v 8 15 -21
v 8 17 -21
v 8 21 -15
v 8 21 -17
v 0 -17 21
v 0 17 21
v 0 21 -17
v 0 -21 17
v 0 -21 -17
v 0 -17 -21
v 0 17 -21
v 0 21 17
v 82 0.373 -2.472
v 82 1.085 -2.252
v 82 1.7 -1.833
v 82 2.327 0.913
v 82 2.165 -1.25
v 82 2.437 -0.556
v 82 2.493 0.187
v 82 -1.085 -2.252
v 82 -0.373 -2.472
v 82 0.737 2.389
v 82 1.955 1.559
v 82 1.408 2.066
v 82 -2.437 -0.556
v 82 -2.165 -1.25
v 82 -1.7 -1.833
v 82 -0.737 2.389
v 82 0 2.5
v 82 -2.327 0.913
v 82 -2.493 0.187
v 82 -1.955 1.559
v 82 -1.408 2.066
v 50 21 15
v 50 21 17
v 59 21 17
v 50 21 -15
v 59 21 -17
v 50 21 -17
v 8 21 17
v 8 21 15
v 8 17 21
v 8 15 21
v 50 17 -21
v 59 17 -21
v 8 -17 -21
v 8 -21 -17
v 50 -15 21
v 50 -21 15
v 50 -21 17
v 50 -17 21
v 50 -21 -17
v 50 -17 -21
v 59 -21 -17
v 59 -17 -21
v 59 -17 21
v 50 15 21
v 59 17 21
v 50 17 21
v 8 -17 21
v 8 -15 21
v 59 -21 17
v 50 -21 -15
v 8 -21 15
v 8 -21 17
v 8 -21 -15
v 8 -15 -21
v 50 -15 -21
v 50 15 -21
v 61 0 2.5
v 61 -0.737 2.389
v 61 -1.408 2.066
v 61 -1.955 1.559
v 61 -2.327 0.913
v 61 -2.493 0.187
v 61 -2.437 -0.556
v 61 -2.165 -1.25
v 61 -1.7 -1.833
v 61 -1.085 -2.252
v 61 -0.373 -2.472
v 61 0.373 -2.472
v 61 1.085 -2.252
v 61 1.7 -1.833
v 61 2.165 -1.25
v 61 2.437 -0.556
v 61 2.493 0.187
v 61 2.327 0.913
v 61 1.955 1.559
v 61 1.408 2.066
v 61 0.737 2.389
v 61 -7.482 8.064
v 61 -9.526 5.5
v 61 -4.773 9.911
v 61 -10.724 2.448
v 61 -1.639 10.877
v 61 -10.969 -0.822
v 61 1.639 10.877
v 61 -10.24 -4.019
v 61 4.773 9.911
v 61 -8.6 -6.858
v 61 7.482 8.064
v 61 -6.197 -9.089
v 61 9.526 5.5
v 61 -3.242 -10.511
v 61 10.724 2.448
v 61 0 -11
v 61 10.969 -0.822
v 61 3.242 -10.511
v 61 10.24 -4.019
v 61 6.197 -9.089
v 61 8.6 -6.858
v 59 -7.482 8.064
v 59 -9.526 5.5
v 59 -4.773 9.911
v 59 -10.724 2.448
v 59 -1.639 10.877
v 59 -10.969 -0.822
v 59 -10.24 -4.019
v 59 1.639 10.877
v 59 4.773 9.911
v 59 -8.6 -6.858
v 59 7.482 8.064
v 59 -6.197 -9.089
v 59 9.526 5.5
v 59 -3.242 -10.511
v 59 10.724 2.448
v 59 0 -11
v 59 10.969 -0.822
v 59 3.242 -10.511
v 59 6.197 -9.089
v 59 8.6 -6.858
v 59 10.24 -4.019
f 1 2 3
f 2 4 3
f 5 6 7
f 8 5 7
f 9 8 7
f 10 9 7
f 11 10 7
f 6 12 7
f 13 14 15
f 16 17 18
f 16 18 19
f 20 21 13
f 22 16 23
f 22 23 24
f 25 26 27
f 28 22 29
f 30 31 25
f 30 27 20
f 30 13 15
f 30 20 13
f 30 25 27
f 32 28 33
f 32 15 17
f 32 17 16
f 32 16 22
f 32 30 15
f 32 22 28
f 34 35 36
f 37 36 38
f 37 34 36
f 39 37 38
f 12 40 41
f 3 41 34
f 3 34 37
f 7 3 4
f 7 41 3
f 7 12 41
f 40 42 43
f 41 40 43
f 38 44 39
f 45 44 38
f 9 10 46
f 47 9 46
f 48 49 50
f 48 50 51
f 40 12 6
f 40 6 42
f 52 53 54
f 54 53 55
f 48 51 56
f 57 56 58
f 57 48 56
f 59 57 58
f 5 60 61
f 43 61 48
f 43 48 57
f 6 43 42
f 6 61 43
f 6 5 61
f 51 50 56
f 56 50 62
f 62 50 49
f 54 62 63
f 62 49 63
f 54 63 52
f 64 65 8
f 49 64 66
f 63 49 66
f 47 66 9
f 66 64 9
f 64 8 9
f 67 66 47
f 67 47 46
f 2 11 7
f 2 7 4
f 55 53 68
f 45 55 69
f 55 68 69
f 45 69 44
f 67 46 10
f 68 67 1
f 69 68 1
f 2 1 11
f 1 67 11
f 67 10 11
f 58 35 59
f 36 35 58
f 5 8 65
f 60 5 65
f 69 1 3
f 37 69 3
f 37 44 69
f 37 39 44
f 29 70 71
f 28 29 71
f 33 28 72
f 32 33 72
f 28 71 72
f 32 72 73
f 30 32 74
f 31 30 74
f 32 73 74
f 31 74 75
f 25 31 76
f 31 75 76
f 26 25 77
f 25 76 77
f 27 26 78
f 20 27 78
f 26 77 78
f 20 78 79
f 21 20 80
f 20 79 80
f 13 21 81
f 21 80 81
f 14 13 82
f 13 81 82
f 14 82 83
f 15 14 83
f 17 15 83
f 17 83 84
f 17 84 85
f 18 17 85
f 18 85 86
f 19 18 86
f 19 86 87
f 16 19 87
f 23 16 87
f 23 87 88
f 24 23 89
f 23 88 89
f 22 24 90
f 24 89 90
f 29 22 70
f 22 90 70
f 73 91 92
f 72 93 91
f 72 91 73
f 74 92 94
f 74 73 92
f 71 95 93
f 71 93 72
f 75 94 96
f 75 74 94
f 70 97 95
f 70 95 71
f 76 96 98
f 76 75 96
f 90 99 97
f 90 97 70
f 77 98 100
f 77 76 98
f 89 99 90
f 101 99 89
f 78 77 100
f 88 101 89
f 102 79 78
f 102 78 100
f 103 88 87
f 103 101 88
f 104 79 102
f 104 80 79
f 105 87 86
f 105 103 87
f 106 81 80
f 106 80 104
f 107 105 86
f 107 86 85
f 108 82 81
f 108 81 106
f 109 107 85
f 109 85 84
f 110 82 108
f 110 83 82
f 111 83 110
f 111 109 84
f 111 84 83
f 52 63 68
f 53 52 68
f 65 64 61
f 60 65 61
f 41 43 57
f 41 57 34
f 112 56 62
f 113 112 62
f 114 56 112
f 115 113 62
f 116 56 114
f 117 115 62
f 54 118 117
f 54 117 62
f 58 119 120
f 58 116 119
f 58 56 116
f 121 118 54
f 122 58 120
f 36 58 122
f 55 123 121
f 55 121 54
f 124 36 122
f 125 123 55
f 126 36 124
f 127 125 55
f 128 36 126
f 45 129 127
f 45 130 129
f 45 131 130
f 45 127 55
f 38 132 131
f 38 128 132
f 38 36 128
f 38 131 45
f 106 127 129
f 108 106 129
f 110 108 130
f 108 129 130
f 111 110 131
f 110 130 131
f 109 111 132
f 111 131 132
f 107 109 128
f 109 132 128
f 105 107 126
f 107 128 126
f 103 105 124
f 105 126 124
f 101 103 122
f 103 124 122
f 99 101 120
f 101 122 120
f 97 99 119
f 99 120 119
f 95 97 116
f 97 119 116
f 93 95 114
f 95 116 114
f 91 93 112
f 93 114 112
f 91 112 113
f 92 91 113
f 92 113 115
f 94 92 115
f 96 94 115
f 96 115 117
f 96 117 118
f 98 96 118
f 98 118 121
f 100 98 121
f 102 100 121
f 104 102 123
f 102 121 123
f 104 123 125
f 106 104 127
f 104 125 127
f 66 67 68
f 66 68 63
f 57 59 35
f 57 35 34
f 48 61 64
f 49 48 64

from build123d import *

# Parameters (mm, degrees)
SKETCH_1_W          = 42
SKETCH_1_H          = 42
EXTRUDE_1_DEPTH     = 59
SKETCH_2_R          = 11
EXTRUDE_2_DEPTH     = 2
SKETCH_3_R          = 2.5
EXTRUDE_3_DEPTH     = 21
CUT_EXTRUDE_START   = -8
CUT_EXTRUDE_1_DEPTH = 42
CHAMFER_1_SIZE      = 4


with BuildPart() as part:
    # 草图1 → 凸台-拉伸1 (new body)
    with BuildSketch(Plane(origin=(0, 0, 0), x_dir=(0, 0, -1), z_dir=(1, 0, 0))):
        Rectangle(SKETCH_1_W, SKETCH_1_H)
    extrude(amount=EXTRUDE_1_DEPTH)

    # 草图2 → 凸台-拉伸2 (add)
    with BuildSketch(Plane(origin=(59, 0, 0), x_dir=(0, 0, -1), z_dir=(1, 0, 0))):
        Circle(SKETCH_2_R)
    extrude(amount=EXTRUDE_2_DEPTH)

    # 草图3 → 凸台-拉伸3 (add)
    with BuildSketch(Plane(origin=(61, 0, 0), x_dir=(0, 0, -1), z_dir=(1, 0, 0))):
        with Locations(Location((0, 0, 0), (0, 0, 180))):
            Circle(SKETCH_3_R)
    extrude(amount=EXTRUDE_3_DEPTH)

    # 草图5 → 切除-拉伸1 (cut)
    with BuildSketch(Plane.ZY.offset(CUT_EXTRUDE_START)):
        Polygon((21, 15), (15, 21), (21, 21), align=None)
        Polygon((21, -21), (21, -15), (15, -21), align=None)
        Polygon((-21, 21), (-21, 15), (-15, 21), align=None)
        Polygon((-21, -15), (-15, -21), (-21, -21), align=None)
    extrude(amount=-CUT_EXTRUDE_1_DEPTH, mode=Mode.SUBTRACT)

    # 倒角1
    chamfer_1_edges = [part.edges().sort_by_distance(p)[0] for p in [
        (4, 21, 21),
        (4, 21, -21),
        (4, -21, -21),
        (4, -21, 21),
        (54.5, 21, 21),
        (54.5, 21, -21),
        (54.5, -21, -21),
        (54.5, -21, 21),
    ]]
    chamfer(chamfer_1_edges, length=CHAMFER_1_SIZE)


solid = part.part
